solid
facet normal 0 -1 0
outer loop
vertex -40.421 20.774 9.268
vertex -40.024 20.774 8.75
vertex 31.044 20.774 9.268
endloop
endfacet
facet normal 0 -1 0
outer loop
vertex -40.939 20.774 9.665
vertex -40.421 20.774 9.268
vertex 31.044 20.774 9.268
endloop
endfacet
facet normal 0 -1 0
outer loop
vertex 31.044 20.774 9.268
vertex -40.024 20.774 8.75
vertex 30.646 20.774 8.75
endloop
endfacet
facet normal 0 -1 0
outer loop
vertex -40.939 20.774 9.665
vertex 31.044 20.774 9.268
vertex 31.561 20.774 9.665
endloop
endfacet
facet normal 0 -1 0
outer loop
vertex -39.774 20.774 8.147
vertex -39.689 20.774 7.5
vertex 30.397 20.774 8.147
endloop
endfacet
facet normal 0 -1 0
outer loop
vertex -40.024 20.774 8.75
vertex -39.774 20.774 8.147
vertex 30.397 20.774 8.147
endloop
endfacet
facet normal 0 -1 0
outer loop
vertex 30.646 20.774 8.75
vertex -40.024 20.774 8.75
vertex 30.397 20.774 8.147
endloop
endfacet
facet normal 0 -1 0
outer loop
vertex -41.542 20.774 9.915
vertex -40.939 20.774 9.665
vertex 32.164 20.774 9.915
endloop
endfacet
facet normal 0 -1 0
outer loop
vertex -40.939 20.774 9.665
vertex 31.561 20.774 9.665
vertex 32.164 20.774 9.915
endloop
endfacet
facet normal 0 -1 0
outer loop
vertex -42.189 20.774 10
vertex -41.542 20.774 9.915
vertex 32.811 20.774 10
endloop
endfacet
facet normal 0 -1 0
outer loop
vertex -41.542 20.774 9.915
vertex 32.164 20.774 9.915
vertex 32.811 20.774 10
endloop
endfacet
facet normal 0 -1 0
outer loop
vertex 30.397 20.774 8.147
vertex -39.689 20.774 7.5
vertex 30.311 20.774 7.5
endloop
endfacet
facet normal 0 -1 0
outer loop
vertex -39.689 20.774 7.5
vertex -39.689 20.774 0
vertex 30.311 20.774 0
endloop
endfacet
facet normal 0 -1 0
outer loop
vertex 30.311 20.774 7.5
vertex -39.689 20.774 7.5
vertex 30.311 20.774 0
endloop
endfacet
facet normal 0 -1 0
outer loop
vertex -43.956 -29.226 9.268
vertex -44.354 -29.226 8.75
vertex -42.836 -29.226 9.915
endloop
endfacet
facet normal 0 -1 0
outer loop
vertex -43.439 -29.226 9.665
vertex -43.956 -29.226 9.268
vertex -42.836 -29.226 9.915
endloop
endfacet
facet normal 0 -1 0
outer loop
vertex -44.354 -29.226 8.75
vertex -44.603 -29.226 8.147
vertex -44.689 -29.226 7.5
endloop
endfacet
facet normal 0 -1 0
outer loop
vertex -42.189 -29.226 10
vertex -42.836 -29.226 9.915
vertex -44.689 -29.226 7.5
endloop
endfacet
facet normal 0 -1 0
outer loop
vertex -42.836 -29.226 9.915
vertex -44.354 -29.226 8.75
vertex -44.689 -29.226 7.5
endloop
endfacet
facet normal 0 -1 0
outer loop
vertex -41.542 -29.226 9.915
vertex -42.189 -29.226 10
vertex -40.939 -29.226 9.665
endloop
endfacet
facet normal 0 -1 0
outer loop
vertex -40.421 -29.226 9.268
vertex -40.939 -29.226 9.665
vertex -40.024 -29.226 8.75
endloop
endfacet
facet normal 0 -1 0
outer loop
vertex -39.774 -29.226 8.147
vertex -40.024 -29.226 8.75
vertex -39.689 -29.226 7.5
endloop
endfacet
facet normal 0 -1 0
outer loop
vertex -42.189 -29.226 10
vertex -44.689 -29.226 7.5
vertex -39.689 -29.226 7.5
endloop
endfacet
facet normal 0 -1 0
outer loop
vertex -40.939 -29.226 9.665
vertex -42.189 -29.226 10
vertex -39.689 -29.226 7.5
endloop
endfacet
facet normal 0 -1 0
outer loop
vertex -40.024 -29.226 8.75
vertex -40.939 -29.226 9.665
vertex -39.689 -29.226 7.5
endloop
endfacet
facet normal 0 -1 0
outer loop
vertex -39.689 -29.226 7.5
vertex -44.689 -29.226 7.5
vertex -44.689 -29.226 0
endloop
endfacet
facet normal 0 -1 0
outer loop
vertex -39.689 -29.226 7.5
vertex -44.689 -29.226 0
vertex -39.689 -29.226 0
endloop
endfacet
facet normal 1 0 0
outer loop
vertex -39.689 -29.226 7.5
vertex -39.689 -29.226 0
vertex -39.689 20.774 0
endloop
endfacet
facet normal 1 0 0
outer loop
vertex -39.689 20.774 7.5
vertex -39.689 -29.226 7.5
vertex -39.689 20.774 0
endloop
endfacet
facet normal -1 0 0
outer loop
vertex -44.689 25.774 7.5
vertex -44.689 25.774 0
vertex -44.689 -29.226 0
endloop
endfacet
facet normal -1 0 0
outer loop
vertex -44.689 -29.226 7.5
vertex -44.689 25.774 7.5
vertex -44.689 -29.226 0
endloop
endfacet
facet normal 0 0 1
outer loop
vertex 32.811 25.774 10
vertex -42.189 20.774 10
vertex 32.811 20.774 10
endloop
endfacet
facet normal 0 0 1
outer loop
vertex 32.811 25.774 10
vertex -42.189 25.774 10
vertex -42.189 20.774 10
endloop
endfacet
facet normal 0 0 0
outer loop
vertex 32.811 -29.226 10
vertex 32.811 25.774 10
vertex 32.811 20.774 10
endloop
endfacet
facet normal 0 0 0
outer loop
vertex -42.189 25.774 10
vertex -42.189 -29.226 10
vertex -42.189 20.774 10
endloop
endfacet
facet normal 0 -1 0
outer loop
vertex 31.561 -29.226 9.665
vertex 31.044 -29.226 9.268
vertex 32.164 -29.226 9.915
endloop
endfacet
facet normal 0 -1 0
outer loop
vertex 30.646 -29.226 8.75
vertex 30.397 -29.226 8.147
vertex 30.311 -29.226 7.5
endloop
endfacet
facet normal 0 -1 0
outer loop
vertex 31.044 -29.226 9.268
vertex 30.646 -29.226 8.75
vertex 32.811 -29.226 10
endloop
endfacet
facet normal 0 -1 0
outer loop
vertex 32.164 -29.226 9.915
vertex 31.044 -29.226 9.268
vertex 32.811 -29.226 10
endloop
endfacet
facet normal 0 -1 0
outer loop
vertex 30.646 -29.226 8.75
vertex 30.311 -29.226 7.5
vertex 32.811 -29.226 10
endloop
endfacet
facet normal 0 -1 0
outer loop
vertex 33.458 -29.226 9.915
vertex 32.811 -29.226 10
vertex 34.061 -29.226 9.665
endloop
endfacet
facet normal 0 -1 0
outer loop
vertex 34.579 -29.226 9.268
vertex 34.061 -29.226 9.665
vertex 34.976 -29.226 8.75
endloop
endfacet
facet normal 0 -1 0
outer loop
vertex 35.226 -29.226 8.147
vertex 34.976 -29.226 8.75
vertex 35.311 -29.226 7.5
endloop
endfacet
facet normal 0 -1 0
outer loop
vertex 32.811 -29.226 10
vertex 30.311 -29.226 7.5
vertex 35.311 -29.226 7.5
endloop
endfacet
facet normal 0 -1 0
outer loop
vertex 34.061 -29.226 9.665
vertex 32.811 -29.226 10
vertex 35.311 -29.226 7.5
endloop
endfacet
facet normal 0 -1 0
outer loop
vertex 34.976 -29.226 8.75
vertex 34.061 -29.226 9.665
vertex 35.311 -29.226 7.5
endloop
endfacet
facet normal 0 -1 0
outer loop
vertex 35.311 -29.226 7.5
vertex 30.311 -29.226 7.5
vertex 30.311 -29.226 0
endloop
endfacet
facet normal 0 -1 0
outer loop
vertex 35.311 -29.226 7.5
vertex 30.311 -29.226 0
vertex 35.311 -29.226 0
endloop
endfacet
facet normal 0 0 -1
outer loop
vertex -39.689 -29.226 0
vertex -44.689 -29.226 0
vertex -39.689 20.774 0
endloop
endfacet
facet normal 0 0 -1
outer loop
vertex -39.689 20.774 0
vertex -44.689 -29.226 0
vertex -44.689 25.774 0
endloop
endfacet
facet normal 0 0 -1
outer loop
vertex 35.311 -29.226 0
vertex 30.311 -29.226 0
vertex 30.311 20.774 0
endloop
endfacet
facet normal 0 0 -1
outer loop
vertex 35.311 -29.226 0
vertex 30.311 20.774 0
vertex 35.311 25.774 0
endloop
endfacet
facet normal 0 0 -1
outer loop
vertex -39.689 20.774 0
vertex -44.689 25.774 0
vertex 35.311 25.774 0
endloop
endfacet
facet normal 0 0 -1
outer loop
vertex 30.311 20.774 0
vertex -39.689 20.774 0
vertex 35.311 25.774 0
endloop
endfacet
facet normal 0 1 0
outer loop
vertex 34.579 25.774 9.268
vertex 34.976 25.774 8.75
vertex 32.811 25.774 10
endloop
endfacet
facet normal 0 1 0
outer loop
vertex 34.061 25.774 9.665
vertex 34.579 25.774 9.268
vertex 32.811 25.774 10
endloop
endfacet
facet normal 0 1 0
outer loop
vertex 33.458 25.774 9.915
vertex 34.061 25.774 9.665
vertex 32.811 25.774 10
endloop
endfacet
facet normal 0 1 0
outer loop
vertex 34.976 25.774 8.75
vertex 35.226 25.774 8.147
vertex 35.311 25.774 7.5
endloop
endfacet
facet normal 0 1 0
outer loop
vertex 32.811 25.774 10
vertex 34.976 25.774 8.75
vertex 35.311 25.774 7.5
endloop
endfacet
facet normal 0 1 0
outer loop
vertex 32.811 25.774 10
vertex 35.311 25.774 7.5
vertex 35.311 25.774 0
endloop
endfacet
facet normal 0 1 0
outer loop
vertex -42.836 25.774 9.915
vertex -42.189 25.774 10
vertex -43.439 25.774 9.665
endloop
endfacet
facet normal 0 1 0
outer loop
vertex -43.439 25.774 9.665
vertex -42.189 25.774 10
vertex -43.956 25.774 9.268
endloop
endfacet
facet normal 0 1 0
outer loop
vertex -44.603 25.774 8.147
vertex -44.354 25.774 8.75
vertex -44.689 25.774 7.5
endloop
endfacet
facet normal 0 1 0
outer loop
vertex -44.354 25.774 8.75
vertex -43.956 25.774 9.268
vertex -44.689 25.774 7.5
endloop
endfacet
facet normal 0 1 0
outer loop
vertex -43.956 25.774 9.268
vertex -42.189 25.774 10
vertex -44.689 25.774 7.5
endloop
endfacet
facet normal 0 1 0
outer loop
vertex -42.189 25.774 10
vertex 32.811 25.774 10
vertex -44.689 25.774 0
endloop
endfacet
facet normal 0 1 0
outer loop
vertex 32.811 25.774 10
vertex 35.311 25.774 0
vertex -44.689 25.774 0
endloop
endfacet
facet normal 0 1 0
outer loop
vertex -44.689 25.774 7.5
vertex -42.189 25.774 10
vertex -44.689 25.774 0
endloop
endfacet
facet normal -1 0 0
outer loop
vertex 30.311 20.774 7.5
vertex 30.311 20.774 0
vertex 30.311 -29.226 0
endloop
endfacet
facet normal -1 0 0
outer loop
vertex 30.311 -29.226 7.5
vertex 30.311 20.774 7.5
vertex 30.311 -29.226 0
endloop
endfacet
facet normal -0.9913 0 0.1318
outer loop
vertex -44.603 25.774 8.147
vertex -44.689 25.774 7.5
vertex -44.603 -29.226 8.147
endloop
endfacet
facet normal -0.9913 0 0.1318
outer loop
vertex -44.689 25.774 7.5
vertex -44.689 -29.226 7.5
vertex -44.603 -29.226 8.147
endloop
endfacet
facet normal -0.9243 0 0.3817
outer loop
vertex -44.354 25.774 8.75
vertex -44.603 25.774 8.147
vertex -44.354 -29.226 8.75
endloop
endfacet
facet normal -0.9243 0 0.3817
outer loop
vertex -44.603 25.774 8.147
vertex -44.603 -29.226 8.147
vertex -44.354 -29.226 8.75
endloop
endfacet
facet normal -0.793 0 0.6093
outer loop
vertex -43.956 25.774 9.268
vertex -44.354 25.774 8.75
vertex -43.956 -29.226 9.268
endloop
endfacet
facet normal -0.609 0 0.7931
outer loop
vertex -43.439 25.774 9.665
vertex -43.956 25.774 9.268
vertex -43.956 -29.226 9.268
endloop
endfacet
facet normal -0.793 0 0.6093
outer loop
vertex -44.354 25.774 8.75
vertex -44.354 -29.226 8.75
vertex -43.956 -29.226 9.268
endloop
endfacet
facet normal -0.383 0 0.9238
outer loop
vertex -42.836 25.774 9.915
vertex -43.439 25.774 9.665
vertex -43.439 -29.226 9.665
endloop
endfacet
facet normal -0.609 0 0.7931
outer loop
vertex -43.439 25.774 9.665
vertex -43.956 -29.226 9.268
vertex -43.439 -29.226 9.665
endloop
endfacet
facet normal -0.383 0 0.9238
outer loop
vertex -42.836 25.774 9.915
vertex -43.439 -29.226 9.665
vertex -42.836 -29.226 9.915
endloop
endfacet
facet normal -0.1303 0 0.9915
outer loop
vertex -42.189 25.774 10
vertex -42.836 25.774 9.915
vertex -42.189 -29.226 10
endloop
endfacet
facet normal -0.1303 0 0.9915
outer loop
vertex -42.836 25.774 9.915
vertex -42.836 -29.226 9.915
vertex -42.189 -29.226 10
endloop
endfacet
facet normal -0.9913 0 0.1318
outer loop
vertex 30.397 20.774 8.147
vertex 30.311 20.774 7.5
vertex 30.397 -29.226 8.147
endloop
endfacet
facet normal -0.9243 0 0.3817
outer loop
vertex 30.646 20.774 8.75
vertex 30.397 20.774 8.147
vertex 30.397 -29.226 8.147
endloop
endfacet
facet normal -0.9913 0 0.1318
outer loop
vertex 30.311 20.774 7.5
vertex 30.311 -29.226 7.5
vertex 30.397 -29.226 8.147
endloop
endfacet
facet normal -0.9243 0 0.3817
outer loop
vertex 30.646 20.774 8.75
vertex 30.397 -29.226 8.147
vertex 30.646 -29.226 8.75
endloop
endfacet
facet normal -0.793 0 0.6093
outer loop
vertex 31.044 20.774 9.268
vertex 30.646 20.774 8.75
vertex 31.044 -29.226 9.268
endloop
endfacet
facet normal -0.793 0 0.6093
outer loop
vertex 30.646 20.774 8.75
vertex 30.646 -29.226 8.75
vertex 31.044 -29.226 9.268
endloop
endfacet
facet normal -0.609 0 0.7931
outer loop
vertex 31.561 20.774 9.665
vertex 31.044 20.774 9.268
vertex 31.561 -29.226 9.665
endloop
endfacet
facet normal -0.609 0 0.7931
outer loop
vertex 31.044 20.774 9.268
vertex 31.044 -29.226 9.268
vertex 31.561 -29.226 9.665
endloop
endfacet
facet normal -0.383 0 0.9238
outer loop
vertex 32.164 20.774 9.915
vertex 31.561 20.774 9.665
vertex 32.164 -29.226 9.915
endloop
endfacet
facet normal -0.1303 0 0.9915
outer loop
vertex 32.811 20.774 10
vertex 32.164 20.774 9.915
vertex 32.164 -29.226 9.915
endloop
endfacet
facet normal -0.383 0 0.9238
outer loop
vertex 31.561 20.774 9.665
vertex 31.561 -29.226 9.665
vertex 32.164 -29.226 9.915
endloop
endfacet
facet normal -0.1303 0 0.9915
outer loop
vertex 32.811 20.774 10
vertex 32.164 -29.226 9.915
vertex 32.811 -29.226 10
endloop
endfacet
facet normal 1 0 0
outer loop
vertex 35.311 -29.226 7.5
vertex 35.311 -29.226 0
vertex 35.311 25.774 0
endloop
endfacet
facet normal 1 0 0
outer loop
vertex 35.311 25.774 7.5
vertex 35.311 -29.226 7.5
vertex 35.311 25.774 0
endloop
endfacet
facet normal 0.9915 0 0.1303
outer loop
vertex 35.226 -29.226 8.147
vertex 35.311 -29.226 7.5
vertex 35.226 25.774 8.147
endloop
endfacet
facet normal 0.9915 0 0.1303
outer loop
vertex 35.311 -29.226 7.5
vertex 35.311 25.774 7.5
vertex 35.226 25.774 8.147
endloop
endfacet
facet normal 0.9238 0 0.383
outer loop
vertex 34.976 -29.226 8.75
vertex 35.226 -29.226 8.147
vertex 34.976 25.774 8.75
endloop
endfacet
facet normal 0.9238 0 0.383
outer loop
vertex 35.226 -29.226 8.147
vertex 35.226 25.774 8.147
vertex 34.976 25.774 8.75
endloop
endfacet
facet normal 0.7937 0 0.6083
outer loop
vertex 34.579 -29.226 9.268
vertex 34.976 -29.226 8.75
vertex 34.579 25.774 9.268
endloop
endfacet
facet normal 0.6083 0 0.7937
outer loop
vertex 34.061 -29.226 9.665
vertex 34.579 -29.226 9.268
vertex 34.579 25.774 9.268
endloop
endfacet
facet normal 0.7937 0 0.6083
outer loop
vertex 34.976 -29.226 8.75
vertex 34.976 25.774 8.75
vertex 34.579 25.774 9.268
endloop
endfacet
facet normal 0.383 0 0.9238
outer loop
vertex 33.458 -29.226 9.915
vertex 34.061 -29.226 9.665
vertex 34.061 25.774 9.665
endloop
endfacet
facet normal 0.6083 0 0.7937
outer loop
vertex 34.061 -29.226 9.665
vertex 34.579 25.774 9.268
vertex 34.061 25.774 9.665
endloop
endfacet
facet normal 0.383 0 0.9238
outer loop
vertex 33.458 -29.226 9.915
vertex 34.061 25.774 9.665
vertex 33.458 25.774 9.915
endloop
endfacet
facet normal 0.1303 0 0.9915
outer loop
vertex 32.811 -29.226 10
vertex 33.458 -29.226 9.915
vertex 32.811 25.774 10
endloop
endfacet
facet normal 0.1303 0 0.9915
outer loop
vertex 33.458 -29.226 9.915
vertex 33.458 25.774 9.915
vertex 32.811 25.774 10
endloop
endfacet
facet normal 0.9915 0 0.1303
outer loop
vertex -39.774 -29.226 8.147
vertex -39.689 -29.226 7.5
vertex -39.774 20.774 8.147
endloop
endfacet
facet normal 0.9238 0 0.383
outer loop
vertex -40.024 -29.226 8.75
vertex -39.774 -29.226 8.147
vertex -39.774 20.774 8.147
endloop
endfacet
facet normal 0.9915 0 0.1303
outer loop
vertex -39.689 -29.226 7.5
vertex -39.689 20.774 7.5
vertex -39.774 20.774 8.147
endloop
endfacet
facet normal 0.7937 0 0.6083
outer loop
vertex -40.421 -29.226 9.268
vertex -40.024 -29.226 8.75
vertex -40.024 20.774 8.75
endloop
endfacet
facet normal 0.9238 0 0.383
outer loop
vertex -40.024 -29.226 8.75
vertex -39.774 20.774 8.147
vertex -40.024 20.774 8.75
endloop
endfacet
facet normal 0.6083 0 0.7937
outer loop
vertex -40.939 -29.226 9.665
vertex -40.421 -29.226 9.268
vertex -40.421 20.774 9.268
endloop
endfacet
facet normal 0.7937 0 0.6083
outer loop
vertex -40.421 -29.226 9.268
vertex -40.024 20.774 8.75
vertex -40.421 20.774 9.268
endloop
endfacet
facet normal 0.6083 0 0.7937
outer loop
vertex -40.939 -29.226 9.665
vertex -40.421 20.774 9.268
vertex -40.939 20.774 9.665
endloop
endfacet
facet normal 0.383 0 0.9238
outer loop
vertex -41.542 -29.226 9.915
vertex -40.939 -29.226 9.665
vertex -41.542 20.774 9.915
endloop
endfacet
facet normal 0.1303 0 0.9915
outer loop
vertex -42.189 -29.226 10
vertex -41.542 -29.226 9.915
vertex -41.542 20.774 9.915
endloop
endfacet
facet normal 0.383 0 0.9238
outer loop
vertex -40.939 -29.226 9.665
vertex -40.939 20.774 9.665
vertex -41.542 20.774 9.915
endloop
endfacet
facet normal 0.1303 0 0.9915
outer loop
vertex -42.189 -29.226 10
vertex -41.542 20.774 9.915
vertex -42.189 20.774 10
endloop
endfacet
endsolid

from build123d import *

# Parameters (mm, degrees)
F1_DEPTH = 10
F2_R     = 2.49999


# Not quite as in the source:
# - a fillet or chamfer is up to 0.001 mm smaller than in the source, because OpenCascade refuses the exact size


with BuildPart() as f1:
    # F0 (on Top) → F1 (new body)
    with BuildSketch(Plane.XY):
        Polygon((-44.6886586582, 25.7738458982), (-44.6886586582, -29.2261541018), (-39.6886586582, -29.2261541018), (-39.6886586582, 20.7738458982), (30.3113413418, 20.7738458982), (30.3113413418, -29.2261541018), (35.3113413418, -29.2261541018), (35.3113413418, 25.7738458982), align=None)
    extrude(amount=F1_DEPTH)

    # F2 (radius 2.5 in the source; OpenCascade refuses exactly that, so slightly less here)
    f2_edges = [f1.edges().sort_by_distance(p)[0] for p in [
        (-44.688659, -1.726154, 10),
        (-39.688659, -4.226154, 10),
        (30.311341, -4.226154, 10),
        (35.311341, -1.726154, 10),
    ]]
    fillet(f2_edges, radius=F2_R)


solid = f1.part
